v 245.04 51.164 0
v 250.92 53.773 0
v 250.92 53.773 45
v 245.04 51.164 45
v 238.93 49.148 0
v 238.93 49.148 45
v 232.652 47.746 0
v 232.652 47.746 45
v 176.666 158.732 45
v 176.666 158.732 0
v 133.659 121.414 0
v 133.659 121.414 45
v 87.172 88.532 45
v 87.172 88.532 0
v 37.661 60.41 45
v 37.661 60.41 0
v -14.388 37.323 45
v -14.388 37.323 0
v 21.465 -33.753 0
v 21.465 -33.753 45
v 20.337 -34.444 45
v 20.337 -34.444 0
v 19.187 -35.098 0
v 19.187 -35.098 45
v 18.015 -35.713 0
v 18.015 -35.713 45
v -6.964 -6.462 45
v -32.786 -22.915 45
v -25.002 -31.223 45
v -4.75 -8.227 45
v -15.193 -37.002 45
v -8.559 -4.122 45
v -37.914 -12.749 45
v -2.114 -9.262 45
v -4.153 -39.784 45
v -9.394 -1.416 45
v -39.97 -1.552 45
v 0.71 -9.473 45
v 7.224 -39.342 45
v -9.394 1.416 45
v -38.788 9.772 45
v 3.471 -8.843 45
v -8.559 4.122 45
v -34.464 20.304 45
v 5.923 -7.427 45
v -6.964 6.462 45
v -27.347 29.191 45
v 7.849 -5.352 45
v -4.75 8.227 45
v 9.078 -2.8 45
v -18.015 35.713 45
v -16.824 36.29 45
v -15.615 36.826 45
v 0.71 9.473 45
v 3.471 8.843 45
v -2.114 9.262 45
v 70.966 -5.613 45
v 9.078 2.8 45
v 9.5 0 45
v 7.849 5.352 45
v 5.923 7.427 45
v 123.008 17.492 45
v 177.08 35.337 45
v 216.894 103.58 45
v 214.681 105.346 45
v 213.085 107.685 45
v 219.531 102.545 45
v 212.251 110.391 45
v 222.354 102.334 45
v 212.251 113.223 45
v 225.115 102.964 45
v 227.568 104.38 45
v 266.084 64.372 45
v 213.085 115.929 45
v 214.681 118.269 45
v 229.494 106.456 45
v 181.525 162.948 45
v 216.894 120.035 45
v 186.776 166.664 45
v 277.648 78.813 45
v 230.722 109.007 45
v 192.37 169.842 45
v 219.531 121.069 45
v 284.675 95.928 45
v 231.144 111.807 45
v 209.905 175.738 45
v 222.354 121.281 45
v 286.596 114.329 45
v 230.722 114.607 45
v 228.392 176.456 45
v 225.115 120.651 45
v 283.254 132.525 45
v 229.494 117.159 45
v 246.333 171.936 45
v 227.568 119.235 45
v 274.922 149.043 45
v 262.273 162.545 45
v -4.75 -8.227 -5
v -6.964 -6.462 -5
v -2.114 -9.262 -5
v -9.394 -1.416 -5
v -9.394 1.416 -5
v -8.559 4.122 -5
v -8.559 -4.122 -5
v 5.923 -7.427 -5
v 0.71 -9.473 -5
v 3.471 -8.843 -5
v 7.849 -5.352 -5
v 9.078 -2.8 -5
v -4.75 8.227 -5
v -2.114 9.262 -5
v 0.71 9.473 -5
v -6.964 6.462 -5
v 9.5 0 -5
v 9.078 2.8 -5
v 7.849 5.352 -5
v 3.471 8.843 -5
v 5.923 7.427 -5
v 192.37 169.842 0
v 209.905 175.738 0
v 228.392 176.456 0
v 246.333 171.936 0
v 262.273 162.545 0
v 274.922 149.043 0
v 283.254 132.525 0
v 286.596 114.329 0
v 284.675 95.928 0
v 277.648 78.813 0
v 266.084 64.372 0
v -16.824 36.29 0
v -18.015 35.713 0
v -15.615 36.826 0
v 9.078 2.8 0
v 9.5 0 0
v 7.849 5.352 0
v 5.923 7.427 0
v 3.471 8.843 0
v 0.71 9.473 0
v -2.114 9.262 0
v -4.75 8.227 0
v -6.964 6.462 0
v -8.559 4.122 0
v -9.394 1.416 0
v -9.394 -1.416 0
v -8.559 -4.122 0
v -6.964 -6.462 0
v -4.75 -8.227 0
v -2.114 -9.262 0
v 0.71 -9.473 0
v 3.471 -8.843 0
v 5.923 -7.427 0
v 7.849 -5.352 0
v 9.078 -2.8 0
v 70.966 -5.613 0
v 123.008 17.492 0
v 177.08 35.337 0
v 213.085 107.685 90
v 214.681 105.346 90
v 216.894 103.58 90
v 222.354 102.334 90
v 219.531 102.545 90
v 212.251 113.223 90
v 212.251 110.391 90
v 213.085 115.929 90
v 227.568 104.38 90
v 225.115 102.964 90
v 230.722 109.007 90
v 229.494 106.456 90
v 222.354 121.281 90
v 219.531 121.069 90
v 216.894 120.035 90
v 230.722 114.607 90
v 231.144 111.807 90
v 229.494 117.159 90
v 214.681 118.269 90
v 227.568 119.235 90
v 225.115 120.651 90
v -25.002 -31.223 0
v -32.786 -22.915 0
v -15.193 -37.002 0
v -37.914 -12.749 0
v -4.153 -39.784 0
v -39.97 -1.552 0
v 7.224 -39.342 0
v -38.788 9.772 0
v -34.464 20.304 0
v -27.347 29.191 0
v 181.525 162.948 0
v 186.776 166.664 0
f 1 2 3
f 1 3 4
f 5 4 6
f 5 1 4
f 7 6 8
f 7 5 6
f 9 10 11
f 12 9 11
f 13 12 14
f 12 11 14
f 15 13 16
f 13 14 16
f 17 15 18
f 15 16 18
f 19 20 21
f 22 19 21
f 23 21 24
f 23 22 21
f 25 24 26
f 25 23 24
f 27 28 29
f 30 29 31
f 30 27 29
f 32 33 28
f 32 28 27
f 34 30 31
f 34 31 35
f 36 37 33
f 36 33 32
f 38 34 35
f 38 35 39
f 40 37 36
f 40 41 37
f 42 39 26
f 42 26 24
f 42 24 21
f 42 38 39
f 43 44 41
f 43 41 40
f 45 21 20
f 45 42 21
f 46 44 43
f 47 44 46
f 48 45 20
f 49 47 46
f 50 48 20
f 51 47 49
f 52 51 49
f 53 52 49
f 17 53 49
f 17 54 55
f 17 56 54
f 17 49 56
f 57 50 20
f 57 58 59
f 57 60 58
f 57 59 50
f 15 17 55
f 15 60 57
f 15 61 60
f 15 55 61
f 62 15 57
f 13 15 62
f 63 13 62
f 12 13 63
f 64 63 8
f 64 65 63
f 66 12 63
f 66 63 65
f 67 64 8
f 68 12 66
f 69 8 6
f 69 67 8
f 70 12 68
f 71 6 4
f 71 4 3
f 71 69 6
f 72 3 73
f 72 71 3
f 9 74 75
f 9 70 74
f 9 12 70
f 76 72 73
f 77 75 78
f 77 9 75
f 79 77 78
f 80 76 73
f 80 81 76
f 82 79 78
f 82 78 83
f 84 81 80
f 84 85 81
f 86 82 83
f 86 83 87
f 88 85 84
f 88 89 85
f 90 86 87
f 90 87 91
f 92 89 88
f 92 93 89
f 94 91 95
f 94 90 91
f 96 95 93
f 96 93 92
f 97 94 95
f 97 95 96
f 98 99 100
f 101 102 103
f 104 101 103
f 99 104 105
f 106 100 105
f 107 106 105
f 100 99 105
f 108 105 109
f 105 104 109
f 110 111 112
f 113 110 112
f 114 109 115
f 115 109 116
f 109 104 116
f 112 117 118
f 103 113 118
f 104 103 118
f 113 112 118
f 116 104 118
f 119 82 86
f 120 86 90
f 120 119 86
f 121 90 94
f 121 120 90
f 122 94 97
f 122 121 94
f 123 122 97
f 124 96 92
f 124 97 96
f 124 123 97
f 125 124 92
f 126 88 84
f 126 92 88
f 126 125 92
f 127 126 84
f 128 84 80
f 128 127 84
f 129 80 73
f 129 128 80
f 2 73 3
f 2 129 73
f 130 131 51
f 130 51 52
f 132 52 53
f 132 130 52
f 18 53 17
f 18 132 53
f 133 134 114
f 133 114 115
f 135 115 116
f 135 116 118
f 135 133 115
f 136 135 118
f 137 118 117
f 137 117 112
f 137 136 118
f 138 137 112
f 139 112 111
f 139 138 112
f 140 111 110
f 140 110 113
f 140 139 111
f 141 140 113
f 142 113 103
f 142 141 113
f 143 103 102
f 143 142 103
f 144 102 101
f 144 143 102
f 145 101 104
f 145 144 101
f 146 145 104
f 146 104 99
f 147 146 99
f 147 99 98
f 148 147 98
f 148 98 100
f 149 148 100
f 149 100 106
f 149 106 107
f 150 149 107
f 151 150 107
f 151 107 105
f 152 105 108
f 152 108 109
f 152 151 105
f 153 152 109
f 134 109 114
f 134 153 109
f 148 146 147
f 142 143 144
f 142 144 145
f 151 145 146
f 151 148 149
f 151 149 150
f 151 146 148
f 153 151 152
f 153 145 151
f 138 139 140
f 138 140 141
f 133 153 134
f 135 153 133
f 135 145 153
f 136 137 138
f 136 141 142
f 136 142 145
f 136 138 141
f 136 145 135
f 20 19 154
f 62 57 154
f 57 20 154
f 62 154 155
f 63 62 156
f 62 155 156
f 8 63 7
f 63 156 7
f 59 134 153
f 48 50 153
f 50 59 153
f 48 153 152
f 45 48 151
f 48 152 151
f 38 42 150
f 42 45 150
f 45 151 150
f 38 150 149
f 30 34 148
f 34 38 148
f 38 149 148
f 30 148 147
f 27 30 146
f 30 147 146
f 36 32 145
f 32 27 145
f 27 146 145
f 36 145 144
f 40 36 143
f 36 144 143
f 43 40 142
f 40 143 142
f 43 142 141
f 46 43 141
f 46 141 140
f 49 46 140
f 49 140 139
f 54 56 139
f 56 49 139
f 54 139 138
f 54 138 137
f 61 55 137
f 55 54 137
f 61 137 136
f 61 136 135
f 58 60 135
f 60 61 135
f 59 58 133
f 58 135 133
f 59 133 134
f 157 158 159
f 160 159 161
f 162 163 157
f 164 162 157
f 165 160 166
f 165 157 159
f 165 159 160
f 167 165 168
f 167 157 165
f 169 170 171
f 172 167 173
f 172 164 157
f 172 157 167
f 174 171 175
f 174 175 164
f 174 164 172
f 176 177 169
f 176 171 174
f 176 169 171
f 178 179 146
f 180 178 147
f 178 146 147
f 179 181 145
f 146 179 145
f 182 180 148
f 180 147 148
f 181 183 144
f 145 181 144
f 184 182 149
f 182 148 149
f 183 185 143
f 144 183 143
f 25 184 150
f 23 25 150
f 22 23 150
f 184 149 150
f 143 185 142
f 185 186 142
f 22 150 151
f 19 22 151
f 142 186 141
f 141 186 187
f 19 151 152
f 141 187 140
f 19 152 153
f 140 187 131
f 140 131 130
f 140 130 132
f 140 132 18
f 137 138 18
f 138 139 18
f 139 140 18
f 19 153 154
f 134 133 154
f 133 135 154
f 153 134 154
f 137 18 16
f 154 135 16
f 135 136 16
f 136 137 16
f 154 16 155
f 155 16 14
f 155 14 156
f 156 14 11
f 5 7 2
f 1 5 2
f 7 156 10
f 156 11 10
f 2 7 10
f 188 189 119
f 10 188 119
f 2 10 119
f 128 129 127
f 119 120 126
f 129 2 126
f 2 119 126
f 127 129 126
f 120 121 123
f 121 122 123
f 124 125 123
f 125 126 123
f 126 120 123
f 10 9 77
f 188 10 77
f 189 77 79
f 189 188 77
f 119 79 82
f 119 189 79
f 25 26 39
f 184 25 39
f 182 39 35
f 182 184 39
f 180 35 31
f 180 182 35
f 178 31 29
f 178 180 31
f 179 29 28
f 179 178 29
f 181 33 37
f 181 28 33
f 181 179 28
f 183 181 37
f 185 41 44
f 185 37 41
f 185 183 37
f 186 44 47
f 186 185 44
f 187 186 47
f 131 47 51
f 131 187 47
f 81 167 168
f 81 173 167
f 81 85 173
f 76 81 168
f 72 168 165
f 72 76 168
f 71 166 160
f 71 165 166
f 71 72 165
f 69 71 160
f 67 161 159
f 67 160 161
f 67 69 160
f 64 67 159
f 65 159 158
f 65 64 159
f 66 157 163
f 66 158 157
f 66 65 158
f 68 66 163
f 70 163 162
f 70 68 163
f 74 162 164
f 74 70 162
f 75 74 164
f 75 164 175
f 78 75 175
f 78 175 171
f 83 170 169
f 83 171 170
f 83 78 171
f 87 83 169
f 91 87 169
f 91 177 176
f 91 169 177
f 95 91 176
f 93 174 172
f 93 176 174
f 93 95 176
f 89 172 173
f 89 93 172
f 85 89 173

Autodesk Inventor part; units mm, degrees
ref_plane "YZ Plane" through (0, 0, 0) normal (1, 0, 0) x (0, 1, 0)
ref_plane "XZ Plane" through (0, 0, 0) normal (0, 1, 0) x (-1, 0, 0)
ref_plane "XY Plane" through (0, 0, 0) normal (0, 0, 1) x (1, 0, 0)
sketch "Эскиз1" plane through (0, 0, 0) normal (0, 0, 1) x (1, 0, 0)
  point P0 (0, 0)
sketch "Эскиз2" plane through (0, 0, 0) normal (0, 0, 1) x (1, 0, 0)
  circle A0 centre (0, 0) radius 9.5
  dimension "d0" = 19
extrude "Выдавливание1" add sketch "Эскиз2" against normal blind 5
sketch "Эскиз3" plane through (0, 0, 0) normal (0, 0, 1) x (1, 0, 0)
  circle A0 centre (0, 0) radius 40
  circle A1 centre (0, 0) radius 9.5 projected
  line L0 (0, 0) -> (221.6445, 111.8073) construction
  arc A2 (-18.0154, 35.7134) -> (18.0154, -35.7134) centre (0, 0) ccw
  arc A3 (250.9196, 53.7731) -> (192.3695, 169.8415) centre (221.6445, 111.8073) ccw
  circle A4 centre (221.6445, 111.8073) radius 65
  circle A5 centre (330.0256, -518.949) radius 575
  circle A6 centre (-221.2225, 573.8341) radius 575
  circle A7 centre (221.6445, 111.8073) radius 10 projected
  point P0 (110.8223, 55.9037)
  point P1 (-14.3885, 37.3225)
  point P2 (21.4651, -33.7528)
  point P3 (232.652, 47.7461)
  point P4 (250.9196, 53.7731)
  point P5 (192.3695, 169.8415)
  point P6 (176.6659, 158.7319)
  dimension "d3" = 80
  dimension "d4" = 1150
  dimension "d10" = 65
extrude "Выдавливание2" add sketch "Эскиз3" along normal blind 45 contours A0 | A6 A4 A5 A0 | A4 A3 | A7
sketch "Эскиз4" plane through (0, 0, 45) normal (0, 0, 1) x (1, 0, 0)
  point P0 (0, 0)
sketch "Эскиз5" plane through (0, 0, 45) normal (0, 0, 1) x (1, 0, 0)
  arc A0 (232.652, 47.7461) -> (176.6659, 158.7319) centre (221.6445, 111.8073) ccw projected
  circle A1 centre (221.6445, 111.8073) radius 9.5
  point P0 (0, 0)
  dimension "d7" = 19
extrude "Выдавливание3" add sketch "Эскиз5" along normal blind 45
properties part number "Нога"
